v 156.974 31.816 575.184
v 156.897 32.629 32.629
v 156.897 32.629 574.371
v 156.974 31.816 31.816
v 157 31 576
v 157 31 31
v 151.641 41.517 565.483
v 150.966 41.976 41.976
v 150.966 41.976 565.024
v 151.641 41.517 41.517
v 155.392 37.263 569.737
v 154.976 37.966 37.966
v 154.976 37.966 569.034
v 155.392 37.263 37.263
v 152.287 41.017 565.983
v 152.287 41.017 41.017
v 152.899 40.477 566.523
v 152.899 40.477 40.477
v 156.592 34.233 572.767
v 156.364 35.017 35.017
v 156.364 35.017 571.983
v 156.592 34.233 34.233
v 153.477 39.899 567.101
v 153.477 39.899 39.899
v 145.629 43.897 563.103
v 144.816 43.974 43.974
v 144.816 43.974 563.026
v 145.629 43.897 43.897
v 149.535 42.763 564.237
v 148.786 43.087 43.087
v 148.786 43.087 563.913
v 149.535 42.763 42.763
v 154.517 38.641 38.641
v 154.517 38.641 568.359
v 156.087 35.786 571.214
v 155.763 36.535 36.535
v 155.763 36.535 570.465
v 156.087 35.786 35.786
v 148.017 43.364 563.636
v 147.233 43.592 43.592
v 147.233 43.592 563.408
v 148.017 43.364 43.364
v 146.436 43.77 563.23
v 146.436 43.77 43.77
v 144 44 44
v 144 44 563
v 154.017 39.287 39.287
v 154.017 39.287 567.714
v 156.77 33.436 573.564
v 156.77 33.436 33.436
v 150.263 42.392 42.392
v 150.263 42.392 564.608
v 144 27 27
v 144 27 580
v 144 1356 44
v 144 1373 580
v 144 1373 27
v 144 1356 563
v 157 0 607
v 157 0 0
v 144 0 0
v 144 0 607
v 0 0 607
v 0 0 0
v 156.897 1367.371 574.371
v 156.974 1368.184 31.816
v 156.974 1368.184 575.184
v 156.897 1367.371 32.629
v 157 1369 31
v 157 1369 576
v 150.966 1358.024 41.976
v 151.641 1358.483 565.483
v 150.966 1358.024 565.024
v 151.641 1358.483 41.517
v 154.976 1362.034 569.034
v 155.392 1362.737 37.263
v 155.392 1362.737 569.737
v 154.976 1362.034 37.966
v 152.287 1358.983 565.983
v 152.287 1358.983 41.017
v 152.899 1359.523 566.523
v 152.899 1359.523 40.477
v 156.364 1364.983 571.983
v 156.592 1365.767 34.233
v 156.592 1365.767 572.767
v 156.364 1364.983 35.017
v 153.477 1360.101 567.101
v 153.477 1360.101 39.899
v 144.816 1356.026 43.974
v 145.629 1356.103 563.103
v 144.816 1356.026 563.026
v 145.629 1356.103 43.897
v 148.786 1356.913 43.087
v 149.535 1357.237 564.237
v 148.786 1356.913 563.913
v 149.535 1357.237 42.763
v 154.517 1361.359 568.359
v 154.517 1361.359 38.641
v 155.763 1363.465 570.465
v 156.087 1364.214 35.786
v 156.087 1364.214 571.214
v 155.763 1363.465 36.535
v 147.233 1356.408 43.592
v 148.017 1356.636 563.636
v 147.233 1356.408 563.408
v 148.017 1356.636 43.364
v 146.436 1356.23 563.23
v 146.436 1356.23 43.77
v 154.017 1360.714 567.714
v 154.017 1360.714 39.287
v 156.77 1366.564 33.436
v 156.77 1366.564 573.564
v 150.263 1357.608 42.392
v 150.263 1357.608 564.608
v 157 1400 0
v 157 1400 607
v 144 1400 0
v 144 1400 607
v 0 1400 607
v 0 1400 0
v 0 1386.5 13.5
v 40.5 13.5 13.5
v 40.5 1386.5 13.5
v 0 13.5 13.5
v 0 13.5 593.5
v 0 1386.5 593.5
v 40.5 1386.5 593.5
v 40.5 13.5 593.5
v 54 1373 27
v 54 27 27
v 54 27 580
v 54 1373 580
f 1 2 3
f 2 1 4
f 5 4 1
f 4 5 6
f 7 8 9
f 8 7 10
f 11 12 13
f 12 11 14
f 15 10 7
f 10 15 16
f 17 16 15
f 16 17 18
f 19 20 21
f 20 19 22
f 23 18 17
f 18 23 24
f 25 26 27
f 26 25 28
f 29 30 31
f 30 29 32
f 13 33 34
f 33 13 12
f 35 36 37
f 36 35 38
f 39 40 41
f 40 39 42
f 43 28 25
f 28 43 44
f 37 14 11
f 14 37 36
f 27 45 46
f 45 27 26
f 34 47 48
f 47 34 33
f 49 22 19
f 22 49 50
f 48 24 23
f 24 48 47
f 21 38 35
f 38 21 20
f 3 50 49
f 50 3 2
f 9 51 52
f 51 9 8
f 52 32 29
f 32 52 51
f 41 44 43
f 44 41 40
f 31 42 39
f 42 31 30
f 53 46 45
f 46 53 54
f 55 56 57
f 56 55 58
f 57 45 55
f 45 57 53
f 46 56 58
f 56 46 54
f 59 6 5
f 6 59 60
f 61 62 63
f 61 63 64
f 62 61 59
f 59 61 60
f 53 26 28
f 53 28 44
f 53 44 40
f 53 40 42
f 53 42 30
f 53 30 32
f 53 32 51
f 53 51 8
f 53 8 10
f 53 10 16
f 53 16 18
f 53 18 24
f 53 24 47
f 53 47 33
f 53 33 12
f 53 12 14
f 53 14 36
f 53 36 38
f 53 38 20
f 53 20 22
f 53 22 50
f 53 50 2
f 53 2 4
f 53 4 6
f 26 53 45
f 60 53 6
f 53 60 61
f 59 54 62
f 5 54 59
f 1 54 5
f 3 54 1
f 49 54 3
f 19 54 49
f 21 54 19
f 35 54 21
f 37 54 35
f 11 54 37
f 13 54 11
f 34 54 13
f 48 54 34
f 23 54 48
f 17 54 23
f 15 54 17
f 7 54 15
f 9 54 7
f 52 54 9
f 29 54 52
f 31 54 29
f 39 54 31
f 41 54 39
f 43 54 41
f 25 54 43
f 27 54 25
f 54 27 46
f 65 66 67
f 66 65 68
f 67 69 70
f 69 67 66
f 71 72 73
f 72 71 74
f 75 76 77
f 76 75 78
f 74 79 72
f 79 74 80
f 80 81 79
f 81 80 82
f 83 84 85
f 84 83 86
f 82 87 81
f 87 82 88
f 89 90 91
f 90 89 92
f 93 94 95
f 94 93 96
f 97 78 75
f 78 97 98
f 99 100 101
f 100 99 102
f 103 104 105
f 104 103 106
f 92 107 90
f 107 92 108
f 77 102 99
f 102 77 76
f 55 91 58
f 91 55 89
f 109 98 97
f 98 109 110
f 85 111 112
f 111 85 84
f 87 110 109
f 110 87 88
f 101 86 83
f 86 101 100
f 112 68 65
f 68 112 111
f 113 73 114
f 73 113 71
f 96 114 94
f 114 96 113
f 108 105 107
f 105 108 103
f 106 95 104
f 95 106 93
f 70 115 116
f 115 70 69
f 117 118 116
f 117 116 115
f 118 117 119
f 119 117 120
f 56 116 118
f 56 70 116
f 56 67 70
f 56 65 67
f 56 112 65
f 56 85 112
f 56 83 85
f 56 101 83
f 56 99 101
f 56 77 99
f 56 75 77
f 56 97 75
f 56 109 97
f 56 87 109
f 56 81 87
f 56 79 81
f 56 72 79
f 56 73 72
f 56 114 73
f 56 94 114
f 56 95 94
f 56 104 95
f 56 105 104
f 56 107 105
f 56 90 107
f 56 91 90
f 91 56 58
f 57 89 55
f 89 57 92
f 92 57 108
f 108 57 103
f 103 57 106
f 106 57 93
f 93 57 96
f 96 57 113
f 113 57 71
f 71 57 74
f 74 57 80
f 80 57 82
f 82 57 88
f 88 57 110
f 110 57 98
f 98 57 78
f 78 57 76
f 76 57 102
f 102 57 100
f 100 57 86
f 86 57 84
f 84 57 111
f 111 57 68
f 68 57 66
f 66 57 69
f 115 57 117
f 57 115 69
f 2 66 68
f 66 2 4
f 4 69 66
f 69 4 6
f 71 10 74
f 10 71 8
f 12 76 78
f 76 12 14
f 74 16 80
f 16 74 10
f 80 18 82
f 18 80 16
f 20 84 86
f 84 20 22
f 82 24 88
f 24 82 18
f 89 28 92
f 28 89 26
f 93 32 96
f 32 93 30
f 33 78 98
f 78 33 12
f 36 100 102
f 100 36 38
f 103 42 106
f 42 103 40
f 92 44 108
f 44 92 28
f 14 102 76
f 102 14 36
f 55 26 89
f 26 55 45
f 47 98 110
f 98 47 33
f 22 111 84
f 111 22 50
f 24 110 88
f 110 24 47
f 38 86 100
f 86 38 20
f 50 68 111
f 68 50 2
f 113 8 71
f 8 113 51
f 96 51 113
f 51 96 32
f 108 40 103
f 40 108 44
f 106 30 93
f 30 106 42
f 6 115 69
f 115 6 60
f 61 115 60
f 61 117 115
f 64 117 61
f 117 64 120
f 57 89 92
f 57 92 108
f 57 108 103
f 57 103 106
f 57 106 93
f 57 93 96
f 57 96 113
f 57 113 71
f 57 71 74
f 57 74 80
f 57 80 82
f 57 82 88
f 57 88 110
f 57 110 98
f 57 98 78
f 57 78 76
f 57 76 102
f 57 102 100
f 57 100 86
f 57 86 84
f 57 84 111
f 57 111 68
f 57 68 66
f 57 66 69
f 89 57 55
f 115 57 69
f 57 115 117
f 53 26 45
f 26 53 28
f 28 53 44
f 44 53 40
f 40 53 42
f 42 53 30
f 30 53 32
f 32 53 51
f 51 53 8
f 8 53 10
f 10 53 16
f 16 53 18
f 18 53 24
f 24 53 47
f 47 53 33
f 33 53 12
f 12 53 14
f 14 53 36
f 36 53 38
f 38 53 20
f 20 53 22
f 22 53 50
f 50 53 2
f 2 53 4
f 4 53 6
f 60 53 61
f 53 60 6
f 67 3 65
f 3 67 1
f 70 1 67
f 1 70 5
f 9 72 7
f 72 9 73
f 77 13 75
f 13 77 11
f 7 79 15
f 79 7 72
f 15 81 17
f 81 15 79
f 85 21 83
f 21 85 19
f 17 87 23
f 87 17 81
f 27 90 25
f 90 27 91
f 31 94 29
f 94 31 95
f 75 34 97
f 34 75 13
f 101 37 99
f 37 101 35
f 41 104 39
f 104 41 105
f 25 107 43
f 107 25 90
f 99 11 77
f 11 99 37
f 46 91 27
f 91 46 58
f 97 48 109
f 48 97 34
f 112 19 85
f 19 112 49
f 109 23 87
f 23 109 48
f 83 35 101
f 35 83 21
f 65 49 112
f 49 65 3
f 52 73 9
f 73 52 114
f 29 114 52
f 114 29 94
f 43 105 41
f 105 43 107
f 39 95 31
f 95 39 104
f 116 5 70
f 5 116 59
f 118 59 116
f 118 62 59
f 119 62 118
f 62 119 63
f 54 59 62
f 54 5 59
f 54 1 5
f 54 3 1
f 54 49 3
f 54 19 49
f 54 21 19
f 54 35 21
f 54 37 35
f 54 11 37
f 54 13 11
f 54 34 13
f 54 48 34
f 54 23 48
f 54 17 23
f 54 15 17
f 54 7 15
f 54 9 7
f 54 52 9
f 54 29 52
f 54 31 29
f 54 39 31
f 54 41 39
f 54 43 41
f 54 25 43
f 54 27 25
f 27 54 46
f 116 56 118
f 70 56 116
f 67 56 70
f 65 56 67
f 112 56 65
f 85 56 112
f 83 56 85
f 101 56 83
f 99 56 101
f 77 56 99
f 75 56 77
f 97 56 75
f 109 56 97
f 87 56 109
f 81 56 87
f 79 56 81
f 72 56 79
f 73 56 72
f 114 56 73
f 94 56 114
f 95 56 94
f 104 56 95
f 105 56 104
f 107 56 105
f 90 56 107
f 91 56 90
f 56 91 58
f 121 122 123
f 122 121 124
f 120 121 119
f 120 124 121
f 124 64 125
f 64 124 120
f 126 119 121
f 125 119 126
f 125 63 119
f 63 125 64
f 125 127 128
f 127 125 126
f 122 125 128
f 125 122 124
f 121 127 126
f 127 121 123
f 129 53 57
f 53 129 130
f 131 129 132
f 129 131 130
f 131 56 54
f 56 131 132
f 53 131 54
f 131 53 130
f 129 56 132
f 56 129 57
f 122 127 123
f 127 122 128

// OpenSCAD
// file: Parameters.scad
$fn=100;

// This value is used to remove any ambiguity when holes are cut out to an extnernal face of an object.
// The shape used to make the hole sticks out this much.
epsilon = 0.01;

// This is the diameter of the hole that is drilled into the chime for the support pins
chimeMountHoleDiameter = 4;

// This is the diameter of the copper pipe used to make the chimes
chimeDiameter = 22;
chimeRadius = chimeDiameter/2;

// This is the height of the arms on the upper and lower supports
supportDepth = 8;

// This is the distance from the back plane to the middle of the chimne
chimeStandoff = 24;

// This is the radius of the hammer hub
hammerBlockRadius = 14;

// This is the distance from the back plane to the pivot point for the hammers
hammerStandoff = 70;



// The magnets are discs 8mm in diameter and 5 mm thick
//magnetRadius = 4;
magnetDiameter = 8;
magnetDepth = 7;


coilOuterDepth = hammerBlockRadius*2+8;
coilOuterHeight = magnetDiameter + 4;

// This is the length of the hammer from the middle of the pivot to the middle of the head
hammerLength = 100;    

// These define the pegs that stick out of the bottom of the bobbins and the coresponding holes
// in the upper chime supports
pegRadius = 2;
pegClearance = 0.2;
pegLength = supportDepth + 1;
bobbinPegXOffset = 8;
bobbinPegYOffset = 12;

// For the sake of a rough model for the top level assembly,
// these values are measured from an arbitrary length of copper pipe.
// Once you have a real piece of pipe cut, change this to improve the accuracy of the top level assemblymodel.
// Even then, do not rely on the calculations from this for actually cutting the back board
sampleTubeLength = 421;
sampleTubeFrequency = 560;
sampleConstant = sampleTubeLength * sampleTubeLength * sampleTubeFrequency;

// Concert A has MIDI note number 69, and has a frwquency of 440 Hz
note69Frequency = 440;

// There are 12 semitones in an octave
twelfthRoot2 = pow(2,1/12);





// This is the width of the hammer block
hammerBlockWidth = magnetDiameter + 4;

hammerBlockCutoutWidth = hammerBlockWidth+2;

// This value is added onto gaps to make the parts a tight push fit, e.g. for a magnet
//tightClearance = 0.1;

// This is the length of the spindle on which the hammer rotates
hammerSpindleLength = 24;

// This is the diameter of the 3d printing filament that we use as a material for the hammer spindle
spindleDiameter = 3;


// This is the distance from the middle of the chime to where the support holes need to be drilled
// One with this value, one with this value * -1
function CalculateChimeHolePosition(chimeLength) = (0.5 - 0.2242) * chimeLength;
// main file
include <Parameters.scad>




architraveWidth = 44;
architraveThickness = 13;

module Architrave(length = 2400)
{

    
    color("white")
    {
        translate([0,architraveWidth-architraveThickness,0])
            intersection()
            {
                cylinder(r=architraveThickness,h=length);
                cube([architraveThickness,architraveThickness,length]);
            }
        cube([architraveThickness,architraveWidth-architraveThickness,length]);
    }
}

module ChamferCutArchitrave(length)
{
    difference()
    {
        union()
        {
            Architrave(length);
        }
        union()
        {
            rotate([45,0,0])
                translate([-epsilon,0,-100])
                    cube([100,100,100]);
            translate([0,0,length])
                rotate([45,0,0])
                    translate([-epsilon,0,-100])
                       cube([100,100,100]);
        }
    }
        
}

module ArchitraveFrame(outerWidth,outerHeight)
{
    // left
    ChamferCutArchitrave(outerHeight);

    // right
    translate([0,outerWidth,outerHeight])
        rotate([180,0,0])
            ChamferCutArchitrave(outerHeight);
    
    // bottom
    translate([0,outerWidth,0])
        rotate([90,0,0])
            ChamferCutArchitrave(outerWidth);
    
    // top
    translate([0,0,outerHeight])
        rotate([-90,0,0])
            ChamferCutArchitrave(outerWidth);


}

module PlankFrame(depth,outerWidth,outerHeight,  thickness)
{
    // bottom
    cube([depth,outerWidth,thickness]);
    
    // top
    translate([0,0,outerHeight-thickness])
        cube([depth,outerWidth,thickness]);
    
    // left
    cube([depth,thickness,outerHeight]);
    
    // right
    translate([0,outerWidth-thickness,0])
        cube([depth,thickness,outerHeight]);
if (0)    
    
    difference()
    {
        union()
        {
            cube([depth,outerWidth,outerHeight]);
        }
        union()
        {
            translate([-epsilon,thickness,thickness])
                cube([depth+2*epsilon,outerWidth-2*thickness,outerHeight-2*thickness]);
        }
    }
     

}

laminateWidth = 145;
laminateThickness = 13.5;

module LaminateStrip(totalLength,firstPlankLength,color1,color2)
{
    color(color1)
    cube([laminateThickness,firstPlankLength,laminateWidth]);
    translate([0,firstPlankLength,0])
    color(color2)
        cube([laminateThickness,totalLength-firstPlankLength,laminateWidth]);
}

module LaminateArea(width,height)
{
    plankLength = 1220;
    
    firstOffcutLength = 2* plankLength - width;
    secondOffcutLength = firstOffcutLength + plankLength - width;
    thirdOffcutLength = secondOffcutLength + plankLength - width;
 //   intersection()
    //{
    //    union()
    //    {
    //        cube([50,width,height]) ;
    //    }
     //   union()
     //   {
            LaminateStrip(width,plankLength,"BurlyWood","BlanchedAlmond");
            translate([0,0,laminateWidth])
            LaminateStrip(width,firstOffcutLength,"SandyBrown","Tan");
            translate([0,0,2*laminateWidth])
            LaminateStrip(width,secondOffcutLength,"Wheat","BurlyWood");
            translate([0,0,3*laminateWidth])
            LaminateStrip(width,thirdOffcutLength,"NavajoWhite","BlanchedAlmond");

     //   }
        
   // }
}

module BoxFrame()
{
    outerWidth = 1400;
    outerHeight = 4 * laminateWidth + 2 * laminateThickness;
    timberWidth = 144;
    framedInnerDepth = 90;

    

    translate([timberWidth,0,0])
        ArchitraveFrame(outerWidth,outerHeight);
    
    // an outer frame made from timber 144 x 12
    color("bisque")
        PlankFrame(144,outerWidth,outerHeight,laminateThickness);
    
    // an inner fram made from 14 mm thick floor planks
    translate([timberWidth-framedInnerDepth,laminateThickness,laminateThickness])
        color("burlywood")
            PlankFrame(framedInnerDepth,outerWidth-2*laminateThickness,outerHeight-2*laminateThickness,laminateThickness);
    
    translate([timberWidth-framedInnerDepth-laminateThickness,laminateThickness,laminateThickness])
    LaminateArea(outerWidth-2*laminateThickness,outerHeight-2*laminateThickness);
}


module FrameStandoff()
{
    difference() 
    {
        union()
        {
            cylinder(d1=12,d2=15,h=6);
        }
        union()
        {
        translate([0,0,-epsilon])
            cylinder(d=4,h=6+2*epsilon); 
        translate([0,0,-epsilon])
            cylinder(d1=8,d2=4,h=4);                 
        }
    }

   
    
}


BoxFrame();
